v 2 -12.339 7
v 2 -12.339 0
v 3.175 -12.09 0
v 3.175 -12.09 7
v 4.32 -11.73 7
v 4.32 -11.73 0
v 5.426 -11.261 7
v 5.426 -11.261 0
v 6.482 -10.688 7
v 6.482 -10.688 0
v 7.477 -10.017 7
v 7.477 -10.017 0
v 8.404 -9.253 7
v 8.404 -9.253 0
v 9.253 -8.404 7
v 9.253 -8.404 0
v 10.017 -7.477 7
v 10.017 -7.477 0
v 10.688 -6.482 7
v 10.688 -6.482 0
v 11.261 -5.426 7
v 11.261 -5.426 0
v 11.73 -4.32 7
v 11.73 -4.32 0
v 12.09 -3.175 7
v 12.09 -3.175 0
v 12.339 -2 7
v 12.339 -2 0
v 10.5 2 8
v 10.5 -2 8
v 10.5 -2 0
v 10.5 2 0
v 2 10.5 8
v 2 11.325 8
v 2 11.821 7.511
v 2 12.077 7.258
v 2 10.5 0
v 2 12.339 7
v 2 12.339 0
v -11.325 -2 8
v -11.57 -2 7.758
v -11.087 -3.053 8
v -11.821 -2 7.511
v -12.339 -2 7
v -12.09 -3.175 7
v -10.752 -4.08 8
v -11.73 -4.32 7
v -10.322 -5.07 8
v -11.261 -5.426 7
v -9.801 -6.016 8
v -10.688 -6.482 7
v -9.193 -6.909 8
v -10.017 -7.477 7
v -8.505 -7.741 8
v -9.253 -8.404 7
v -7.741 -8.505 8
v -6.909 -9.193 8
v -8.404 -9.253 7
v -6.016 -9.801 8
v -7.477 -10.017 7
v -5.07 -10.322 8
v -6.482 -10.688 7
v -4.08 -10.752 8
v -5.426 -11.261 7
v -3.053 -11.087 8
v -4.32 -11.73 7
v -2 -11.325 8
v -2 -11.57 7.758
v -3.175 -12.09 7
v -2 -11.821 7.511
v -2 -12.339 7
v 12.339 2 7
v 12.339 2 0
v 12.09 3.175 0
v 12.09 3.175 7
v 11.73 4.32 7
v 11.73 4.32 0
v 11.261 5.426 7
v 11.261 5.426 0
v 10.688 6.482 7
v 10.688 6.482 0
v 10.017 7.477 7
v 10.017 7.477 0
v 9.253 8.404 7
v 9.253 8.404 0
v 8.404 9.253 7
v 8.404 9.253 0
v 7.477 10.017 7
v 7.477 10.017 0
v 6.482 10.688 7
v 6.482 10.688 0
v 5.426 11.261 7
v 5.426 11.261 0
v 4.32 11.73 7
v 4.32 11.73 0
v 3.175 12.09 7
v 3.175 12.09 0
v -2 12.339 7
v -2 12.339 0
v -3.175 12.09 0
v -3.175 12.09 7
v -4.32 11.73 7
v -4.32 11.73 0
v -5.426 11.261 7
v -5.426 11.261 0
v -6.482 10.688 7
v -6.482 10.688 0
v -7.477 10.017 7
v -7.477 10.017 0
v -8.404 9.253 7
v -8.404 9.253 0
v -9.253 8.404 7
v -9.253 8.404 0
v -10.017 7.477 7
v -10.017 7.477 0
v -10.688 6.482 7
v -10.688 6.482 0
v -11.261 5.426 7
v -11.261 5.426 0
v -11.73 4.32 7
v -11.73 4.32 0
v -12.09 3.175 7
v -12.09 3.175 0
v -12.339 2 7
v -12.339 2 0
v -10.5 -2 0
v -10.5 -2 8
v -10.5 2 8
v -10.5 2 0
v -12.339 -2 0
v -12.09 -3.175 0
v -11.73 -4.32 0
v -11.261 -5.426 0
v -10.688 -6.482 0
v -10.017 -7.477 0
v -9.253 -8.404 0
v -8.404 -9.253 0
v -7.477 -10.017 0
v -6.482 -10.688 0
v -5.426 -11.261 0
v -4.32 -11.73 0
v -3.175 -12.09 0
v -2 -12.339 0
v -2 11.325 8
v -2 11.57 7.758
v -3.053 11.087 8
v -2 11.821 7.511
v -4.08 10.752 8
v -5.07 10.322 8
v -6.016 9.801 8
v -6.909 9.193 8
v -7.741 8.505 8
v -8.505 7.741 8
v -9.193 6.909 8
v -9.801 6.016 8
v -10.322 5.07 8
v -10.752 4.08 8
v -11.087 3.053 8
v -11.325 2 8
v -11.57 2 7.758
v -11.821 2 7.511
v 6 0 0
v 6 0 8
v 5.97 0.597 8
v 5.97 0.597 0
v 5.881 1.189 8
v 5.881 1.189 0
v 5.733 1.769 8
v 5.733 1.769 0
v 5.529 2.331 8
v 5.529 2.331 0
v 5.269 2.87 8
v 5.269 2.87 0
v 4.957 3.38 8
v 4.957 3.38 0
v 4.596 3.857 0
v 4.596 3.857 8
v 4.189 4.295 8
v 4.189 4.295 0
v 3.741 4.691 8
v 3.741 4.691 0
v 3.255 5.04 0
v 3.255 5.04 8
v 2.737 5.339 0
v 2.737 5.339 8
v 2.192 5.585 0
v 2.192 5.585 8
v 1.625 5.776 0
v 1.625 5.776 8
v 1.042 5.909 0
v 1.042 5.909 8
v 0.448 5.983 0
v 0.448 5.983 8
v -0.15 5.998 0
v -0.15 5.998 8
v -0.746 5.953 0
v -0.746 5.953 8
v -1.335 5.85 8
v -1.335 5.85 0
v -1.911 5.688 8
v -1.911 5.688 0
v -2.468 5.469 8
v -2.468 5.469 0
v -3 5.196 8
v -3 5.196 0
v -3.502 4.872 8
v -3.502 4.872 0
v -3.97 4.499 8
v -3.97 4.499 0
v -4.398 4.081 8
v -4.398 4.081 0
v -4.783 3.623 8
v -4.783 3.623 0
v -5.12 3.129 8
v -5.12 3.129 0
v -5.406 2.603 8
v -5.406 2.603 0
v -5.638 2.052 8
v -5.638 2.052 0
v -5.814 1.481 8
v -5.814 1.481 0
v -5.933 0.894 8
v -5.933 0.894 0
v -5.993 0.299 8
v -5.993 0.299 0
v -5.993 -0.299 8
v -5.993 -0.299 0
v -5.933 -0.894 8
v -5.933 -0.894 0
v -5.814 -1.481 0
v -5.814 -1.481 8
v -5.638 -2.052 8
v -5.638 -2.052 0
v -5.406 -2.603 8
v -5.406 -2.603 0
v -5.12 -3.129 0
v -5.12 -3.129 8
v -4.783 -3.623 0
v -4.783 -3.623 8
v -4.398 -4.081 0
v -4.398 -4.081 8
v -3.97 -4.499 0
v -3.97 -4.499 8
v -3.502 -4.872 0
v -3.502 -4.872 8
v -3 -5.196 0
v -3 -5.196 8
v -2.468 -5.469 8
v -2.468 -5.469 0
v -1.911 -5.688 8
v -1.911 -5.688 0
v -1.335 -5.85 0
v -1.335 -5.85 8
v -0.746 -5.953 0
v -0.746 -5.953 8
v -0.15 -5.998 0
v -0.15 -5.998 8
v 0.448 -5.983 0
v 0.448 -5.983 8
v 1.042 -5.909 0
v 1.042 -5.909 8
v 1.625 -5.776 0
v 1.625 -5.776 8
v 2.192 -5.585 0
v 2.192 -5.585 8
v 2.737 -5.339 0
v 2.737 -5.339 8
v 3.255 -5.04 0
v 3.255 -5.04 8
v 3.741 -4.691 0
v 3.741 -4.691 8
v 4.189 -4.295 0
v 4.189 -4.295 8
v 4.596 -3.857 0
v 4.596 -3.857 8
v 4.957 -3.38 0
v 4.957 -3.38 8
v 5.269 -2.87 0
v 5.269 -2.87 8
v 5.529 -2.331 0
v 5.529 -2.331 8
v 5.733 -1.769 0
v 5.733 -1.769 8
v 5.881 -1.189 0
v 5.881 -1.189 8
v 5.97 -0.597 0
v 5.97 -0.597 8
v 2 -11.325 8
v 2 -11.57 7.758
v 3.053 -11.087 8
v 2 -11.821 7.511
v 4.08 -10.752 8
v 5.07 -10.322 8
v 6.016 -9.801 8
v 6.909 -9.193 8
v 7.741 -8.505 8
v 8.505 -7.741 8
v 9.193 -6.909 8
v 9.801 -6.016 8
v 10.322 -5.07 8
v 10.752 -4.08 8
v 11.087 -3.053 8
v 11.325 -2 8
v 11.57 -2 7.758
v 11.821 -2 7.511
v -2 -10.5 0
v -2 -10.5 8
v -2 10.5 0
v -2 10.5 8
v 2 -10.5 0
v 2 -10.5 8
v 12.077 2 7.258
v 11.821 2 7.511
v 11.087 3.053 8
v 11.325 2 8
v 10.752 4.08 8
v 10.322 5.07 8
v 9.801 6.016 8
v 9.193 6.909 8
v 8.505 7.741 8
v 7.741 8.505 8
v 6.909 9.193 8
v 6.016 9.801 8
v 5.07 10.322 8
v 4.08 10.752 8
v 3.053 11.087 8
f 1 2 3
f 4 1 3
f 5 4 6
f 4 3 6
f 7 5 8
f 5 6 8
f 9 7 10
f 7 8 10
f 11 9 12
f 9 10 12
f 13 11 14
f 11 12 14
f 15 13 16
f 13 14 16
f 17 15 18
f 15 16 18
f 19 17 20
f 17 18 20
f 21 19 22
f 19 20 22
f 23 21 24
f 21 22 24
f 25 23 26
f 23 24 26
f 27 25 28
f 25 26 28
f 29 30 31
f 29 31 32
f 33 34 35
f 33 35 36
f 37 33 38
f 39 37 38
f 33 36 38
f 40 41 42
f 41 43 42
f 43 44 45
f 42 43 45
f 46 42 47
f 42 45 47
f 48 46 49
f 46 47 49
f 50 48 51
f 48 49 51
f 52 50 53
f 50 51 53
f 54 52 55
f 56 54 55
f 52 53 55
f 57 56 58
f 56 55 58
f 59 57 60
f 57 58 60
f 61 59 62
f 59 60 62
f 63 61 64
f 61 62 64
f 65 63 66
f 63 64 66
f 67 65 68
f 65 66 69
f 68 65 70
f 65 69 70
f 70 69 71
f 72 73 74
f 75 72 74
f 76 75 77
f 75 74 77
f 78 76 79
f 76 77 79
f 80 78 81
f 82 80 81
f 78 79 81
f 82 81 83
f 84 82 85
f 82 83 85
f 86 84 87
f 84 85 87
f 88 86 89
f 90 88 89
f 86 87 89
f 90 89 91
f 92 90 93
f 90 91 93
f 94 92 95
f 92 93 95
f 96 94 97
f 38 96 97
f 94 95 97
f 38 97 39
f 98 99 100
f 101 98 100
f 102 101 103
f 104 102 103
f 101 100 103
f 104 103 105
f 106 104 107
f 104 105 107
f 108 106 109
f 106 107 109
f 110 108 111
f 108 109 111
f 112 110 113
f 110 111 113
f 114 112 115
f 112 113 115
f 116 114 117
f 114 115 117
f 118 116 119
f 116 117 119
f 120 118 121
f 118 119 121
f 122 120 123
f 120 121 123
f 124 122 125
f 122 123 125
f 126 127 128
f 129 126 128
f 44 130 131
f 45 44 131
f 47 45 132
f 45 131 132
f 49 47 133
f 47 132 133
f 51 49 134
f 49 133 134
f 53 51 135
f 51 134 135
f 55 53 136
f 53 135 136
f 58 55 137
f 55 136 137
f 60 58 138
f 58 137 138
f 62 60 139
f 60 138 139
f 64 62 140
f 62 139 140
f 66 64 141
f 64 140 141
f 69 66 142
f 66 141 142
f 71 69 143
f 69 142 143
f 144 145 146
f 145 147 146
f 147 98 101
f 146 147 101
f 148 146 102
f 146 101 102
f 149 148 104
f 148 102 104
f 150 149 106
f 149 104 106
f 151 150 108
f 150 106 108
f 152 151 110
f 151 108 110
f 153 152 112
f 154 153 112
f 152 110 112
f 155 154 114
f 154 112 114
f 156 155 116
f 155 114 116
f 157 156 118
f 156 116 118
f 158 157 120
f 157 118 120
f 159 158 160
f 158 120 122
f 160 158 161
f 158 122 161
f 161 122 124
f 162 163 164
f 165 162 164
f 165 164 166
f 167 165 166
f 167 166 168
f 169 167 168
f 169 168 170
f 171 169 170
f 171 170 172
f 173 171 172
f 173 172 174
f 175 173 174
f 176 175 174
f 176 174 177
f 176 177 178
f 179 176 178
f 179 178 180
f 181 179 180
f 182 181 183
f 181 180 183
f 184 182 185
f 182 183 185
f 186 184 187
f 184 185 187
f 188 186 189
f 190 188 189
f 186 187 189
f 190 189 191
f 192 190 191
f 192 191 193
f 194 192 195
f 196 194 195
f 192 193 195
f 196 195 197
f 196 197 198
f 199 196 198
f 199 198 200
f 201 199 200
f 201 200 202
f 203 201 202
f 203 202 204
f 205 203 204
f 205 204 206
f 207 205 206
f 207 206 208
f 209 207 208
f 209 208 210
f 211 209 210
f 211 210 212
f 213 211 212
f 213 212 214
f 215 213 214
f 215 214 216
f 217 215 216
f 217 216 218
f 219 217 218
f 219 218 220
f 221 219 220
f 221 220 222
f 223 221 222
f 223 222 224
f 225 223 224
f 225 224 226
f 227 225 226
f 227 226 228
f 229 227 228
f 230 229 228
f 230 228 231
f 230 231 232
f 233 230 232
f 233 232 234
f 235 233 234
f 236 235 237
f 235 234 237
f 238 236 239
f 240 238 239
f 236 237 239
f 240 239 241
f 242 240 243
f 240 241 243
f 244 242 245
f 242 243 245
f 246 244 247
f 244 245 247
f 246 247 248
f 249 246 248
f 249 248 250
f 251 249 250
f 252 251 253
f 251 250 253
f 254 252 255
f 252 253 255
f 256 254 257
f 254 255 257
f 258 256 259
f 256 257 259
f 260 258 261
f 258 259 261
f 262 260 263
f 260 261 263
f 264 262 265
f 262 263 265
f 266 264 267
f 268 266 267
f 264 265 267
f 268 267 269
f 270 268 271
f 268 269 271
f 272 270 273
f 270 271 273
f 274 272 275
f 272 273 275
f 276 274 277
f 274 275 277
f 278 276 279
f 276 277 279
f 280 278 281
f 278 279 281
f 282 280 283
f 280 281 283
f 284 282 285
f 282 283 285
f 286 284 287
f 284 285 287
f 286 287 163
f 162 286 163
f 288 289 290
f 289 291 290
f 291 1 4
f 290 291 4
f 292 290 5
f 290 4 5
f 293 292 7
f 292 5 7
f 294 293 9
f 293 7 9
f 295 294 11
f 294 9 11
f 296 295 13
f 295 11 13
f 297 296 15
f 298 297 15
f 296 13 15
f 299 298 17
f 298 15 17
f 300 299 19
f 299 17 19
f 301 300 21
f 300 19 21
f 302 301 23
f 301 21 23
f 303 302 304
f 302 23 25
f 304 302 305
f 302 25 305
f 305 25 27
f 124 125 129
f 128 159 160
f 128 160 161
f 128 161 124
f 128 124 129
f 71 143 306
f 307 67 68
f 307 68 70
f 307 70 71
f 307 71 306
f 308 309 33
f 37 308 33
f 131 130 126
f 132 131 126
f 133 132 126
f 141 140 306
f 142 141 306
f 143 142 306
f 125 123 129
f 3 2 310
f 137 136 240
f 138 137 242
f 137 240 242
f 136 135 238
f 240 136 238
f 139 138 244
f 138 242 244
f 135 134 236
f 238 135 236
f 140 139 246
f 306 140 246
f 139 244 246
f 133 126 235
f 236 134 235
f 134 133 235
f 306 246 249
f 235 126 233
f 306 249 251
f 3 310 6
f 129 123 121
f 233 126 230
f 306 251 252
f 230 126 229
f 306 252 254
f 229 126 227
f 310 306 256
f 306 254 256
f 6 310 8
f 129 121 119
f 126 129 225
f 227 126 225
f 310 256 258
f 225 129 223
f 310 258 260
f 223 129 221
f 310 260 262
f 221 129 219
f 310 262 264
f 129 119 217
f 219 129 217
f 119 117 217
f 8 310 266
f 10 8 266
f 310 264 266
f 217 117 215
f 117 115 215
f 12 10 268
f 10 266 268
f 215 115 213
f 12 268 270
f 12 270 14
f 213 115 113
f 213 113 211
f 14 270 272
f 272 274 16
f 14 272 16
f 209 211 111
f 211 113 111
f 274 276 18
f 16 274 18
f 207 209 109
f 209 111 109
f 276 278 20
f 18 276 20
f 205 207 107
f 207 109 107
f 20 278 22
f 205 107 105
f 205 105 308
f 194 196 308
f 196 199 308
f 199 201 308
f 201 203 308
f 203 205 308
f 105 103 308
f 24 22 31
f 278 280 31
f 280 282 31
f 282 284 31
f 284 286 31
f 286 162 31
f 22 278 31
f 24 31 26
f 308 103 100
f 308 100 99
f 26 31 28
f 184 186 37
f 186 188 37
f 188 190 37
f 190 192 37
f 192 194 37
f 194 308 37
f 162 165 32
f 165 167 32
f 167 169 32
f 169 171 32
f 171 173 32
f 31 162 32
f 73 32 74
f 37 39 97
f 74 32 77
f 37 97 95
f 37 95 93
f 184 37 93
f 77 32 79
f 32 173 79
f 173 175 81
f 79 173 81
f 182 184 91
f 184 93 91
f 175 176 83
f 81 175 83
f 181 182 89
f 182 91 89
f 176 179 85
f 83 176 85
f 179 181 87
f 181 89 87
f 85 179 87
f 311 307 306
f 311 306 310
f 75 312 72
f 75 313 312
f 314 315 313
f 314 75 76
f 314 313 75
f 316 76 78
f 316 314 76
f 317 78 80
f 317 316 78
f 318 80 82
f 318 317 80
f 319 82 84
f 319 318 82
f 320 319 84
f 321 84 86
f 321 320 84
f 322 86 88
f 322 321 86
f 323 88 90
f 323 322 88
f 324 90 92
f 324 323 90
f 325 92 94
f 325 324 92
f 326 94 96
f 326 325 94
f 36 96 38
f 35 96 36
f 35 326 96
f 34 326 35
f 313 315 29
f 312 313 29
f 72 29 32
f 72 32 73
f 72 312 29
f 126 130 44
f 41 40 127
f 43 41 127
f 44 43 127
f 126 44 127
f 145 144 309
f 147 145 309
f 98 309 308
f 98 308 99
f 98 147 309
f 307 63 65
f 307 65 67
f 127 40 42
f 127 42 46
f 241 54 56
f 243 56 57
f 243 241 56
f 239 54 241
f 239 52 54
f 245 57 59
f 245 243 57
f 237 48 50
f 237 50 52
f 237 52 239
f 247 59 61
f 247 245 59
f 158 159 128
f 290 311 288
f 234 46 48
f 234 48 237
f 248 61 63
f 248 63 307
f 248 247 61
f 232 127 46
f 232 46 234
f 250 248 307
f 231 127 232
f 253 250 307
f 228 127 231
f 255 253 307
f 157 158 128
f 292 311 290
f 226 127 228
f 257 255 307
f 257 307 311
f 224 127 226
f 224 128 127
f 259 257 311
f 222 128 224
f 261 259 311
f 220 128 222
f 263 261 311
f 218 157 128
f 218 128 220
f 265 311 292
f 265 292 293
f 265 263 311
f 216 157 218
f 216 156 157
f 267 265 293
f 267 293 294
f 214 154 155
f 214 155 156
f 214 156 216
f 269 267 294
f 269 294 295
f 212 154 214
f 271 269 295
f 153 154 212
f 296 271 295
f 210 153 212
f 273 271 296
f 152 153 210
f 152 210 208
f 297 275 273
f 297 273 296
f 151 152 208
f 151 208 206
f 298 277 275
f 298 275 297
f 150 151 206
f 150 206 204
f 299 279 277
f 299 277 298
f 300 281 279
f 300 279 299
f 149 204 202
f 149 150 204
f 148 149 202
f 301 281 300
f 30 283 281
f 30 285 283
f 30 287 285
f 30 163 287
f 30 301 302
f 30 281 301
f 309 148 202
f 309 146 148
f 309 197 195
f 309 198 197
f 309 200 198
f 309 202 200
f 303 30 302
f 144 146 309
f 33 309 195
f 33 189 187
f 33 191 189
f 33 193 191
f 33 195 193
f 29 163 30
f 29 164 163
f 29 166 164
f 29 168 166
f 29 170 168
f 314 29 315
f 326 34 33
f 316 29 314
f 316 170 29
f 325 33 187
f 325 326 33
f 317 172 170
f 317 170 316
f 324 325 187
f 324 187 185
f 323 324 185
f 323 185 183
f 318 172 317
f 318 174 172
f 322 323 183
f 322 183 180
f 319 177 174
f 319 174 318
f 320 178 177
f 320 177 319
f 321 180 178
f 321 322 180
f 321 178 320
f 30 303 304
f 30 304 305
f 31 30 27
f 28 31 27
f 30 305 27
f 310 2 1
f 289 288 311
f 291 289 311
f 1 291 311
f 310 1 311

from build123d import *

# Parameters (mm, degrees)
SKETCH1_R           = 12.5
BOSS_EXTRUDE1_DEPTH = 8
SKETCH2_R           = 6
CUT_EXTRUDE1_DEPTH  = 20.403607912
SKETCH3_W           = 4
SKETCH3_H           = 4
CUT_EXTRUDE2_DEPTH  = 20.403607912
CHAMFER1_SIZE       = 1


with BuildPart() as part:
    # Sketch1 → Boss-Extrude1 (new body)
    with BuildSketch(Plane.XY):
        Circle(SKETCH1_R)
    extrude(amount=BOSS_EXTRUDE1_DEPTH)

    # Sketch2 → Cut-Extrude1 (cut, through all)
    with BuildSketch(Plane.XY.offset(8)):
        Circle(SKETCH2_R)
    extrude(amount=-CUT_EXTRUDE1_DEPTH, mode=Mode.SUBTRACT)

    # Sketch3 → Cut-Extrude2 (cut, through all)
    with BuildSketch(Plane.XY.offset(8)):
        with Locations((12.5, 0)):
            Rectangle(SKETCH3_W, SKETCH3_H)
        with Locations((0, 12.5)):
            Rectangle(SKETCH3_W, SKETCH3_H)
        with Locations((0, -12.5)):
            Rectangle(SKETCH3_W, SKETCH3_H)
        with Locations((-12.5, 0)):
            Rectangle(SKETCH3_W, SKETCH3_H)
    extrude(amount=-CUT_EXTRUDE2_DEPTH, mode=Mode.SUBTRACT)

    # Chamfer1
    chamfer1_edges = [part.edges().sort_by_distance(p)[0] for p in [
        (-8.838834765, 8.838834765, 8),
        (-8.838834765, -8.838834765, 8),
        (8.838834765, -8.838834765, 8),
        (8.838834765, 8.838834765, 8),
    ]]
    chamfer(chamfer1_edges, length=CHAMFER1_SIZE)


solid = part.part
